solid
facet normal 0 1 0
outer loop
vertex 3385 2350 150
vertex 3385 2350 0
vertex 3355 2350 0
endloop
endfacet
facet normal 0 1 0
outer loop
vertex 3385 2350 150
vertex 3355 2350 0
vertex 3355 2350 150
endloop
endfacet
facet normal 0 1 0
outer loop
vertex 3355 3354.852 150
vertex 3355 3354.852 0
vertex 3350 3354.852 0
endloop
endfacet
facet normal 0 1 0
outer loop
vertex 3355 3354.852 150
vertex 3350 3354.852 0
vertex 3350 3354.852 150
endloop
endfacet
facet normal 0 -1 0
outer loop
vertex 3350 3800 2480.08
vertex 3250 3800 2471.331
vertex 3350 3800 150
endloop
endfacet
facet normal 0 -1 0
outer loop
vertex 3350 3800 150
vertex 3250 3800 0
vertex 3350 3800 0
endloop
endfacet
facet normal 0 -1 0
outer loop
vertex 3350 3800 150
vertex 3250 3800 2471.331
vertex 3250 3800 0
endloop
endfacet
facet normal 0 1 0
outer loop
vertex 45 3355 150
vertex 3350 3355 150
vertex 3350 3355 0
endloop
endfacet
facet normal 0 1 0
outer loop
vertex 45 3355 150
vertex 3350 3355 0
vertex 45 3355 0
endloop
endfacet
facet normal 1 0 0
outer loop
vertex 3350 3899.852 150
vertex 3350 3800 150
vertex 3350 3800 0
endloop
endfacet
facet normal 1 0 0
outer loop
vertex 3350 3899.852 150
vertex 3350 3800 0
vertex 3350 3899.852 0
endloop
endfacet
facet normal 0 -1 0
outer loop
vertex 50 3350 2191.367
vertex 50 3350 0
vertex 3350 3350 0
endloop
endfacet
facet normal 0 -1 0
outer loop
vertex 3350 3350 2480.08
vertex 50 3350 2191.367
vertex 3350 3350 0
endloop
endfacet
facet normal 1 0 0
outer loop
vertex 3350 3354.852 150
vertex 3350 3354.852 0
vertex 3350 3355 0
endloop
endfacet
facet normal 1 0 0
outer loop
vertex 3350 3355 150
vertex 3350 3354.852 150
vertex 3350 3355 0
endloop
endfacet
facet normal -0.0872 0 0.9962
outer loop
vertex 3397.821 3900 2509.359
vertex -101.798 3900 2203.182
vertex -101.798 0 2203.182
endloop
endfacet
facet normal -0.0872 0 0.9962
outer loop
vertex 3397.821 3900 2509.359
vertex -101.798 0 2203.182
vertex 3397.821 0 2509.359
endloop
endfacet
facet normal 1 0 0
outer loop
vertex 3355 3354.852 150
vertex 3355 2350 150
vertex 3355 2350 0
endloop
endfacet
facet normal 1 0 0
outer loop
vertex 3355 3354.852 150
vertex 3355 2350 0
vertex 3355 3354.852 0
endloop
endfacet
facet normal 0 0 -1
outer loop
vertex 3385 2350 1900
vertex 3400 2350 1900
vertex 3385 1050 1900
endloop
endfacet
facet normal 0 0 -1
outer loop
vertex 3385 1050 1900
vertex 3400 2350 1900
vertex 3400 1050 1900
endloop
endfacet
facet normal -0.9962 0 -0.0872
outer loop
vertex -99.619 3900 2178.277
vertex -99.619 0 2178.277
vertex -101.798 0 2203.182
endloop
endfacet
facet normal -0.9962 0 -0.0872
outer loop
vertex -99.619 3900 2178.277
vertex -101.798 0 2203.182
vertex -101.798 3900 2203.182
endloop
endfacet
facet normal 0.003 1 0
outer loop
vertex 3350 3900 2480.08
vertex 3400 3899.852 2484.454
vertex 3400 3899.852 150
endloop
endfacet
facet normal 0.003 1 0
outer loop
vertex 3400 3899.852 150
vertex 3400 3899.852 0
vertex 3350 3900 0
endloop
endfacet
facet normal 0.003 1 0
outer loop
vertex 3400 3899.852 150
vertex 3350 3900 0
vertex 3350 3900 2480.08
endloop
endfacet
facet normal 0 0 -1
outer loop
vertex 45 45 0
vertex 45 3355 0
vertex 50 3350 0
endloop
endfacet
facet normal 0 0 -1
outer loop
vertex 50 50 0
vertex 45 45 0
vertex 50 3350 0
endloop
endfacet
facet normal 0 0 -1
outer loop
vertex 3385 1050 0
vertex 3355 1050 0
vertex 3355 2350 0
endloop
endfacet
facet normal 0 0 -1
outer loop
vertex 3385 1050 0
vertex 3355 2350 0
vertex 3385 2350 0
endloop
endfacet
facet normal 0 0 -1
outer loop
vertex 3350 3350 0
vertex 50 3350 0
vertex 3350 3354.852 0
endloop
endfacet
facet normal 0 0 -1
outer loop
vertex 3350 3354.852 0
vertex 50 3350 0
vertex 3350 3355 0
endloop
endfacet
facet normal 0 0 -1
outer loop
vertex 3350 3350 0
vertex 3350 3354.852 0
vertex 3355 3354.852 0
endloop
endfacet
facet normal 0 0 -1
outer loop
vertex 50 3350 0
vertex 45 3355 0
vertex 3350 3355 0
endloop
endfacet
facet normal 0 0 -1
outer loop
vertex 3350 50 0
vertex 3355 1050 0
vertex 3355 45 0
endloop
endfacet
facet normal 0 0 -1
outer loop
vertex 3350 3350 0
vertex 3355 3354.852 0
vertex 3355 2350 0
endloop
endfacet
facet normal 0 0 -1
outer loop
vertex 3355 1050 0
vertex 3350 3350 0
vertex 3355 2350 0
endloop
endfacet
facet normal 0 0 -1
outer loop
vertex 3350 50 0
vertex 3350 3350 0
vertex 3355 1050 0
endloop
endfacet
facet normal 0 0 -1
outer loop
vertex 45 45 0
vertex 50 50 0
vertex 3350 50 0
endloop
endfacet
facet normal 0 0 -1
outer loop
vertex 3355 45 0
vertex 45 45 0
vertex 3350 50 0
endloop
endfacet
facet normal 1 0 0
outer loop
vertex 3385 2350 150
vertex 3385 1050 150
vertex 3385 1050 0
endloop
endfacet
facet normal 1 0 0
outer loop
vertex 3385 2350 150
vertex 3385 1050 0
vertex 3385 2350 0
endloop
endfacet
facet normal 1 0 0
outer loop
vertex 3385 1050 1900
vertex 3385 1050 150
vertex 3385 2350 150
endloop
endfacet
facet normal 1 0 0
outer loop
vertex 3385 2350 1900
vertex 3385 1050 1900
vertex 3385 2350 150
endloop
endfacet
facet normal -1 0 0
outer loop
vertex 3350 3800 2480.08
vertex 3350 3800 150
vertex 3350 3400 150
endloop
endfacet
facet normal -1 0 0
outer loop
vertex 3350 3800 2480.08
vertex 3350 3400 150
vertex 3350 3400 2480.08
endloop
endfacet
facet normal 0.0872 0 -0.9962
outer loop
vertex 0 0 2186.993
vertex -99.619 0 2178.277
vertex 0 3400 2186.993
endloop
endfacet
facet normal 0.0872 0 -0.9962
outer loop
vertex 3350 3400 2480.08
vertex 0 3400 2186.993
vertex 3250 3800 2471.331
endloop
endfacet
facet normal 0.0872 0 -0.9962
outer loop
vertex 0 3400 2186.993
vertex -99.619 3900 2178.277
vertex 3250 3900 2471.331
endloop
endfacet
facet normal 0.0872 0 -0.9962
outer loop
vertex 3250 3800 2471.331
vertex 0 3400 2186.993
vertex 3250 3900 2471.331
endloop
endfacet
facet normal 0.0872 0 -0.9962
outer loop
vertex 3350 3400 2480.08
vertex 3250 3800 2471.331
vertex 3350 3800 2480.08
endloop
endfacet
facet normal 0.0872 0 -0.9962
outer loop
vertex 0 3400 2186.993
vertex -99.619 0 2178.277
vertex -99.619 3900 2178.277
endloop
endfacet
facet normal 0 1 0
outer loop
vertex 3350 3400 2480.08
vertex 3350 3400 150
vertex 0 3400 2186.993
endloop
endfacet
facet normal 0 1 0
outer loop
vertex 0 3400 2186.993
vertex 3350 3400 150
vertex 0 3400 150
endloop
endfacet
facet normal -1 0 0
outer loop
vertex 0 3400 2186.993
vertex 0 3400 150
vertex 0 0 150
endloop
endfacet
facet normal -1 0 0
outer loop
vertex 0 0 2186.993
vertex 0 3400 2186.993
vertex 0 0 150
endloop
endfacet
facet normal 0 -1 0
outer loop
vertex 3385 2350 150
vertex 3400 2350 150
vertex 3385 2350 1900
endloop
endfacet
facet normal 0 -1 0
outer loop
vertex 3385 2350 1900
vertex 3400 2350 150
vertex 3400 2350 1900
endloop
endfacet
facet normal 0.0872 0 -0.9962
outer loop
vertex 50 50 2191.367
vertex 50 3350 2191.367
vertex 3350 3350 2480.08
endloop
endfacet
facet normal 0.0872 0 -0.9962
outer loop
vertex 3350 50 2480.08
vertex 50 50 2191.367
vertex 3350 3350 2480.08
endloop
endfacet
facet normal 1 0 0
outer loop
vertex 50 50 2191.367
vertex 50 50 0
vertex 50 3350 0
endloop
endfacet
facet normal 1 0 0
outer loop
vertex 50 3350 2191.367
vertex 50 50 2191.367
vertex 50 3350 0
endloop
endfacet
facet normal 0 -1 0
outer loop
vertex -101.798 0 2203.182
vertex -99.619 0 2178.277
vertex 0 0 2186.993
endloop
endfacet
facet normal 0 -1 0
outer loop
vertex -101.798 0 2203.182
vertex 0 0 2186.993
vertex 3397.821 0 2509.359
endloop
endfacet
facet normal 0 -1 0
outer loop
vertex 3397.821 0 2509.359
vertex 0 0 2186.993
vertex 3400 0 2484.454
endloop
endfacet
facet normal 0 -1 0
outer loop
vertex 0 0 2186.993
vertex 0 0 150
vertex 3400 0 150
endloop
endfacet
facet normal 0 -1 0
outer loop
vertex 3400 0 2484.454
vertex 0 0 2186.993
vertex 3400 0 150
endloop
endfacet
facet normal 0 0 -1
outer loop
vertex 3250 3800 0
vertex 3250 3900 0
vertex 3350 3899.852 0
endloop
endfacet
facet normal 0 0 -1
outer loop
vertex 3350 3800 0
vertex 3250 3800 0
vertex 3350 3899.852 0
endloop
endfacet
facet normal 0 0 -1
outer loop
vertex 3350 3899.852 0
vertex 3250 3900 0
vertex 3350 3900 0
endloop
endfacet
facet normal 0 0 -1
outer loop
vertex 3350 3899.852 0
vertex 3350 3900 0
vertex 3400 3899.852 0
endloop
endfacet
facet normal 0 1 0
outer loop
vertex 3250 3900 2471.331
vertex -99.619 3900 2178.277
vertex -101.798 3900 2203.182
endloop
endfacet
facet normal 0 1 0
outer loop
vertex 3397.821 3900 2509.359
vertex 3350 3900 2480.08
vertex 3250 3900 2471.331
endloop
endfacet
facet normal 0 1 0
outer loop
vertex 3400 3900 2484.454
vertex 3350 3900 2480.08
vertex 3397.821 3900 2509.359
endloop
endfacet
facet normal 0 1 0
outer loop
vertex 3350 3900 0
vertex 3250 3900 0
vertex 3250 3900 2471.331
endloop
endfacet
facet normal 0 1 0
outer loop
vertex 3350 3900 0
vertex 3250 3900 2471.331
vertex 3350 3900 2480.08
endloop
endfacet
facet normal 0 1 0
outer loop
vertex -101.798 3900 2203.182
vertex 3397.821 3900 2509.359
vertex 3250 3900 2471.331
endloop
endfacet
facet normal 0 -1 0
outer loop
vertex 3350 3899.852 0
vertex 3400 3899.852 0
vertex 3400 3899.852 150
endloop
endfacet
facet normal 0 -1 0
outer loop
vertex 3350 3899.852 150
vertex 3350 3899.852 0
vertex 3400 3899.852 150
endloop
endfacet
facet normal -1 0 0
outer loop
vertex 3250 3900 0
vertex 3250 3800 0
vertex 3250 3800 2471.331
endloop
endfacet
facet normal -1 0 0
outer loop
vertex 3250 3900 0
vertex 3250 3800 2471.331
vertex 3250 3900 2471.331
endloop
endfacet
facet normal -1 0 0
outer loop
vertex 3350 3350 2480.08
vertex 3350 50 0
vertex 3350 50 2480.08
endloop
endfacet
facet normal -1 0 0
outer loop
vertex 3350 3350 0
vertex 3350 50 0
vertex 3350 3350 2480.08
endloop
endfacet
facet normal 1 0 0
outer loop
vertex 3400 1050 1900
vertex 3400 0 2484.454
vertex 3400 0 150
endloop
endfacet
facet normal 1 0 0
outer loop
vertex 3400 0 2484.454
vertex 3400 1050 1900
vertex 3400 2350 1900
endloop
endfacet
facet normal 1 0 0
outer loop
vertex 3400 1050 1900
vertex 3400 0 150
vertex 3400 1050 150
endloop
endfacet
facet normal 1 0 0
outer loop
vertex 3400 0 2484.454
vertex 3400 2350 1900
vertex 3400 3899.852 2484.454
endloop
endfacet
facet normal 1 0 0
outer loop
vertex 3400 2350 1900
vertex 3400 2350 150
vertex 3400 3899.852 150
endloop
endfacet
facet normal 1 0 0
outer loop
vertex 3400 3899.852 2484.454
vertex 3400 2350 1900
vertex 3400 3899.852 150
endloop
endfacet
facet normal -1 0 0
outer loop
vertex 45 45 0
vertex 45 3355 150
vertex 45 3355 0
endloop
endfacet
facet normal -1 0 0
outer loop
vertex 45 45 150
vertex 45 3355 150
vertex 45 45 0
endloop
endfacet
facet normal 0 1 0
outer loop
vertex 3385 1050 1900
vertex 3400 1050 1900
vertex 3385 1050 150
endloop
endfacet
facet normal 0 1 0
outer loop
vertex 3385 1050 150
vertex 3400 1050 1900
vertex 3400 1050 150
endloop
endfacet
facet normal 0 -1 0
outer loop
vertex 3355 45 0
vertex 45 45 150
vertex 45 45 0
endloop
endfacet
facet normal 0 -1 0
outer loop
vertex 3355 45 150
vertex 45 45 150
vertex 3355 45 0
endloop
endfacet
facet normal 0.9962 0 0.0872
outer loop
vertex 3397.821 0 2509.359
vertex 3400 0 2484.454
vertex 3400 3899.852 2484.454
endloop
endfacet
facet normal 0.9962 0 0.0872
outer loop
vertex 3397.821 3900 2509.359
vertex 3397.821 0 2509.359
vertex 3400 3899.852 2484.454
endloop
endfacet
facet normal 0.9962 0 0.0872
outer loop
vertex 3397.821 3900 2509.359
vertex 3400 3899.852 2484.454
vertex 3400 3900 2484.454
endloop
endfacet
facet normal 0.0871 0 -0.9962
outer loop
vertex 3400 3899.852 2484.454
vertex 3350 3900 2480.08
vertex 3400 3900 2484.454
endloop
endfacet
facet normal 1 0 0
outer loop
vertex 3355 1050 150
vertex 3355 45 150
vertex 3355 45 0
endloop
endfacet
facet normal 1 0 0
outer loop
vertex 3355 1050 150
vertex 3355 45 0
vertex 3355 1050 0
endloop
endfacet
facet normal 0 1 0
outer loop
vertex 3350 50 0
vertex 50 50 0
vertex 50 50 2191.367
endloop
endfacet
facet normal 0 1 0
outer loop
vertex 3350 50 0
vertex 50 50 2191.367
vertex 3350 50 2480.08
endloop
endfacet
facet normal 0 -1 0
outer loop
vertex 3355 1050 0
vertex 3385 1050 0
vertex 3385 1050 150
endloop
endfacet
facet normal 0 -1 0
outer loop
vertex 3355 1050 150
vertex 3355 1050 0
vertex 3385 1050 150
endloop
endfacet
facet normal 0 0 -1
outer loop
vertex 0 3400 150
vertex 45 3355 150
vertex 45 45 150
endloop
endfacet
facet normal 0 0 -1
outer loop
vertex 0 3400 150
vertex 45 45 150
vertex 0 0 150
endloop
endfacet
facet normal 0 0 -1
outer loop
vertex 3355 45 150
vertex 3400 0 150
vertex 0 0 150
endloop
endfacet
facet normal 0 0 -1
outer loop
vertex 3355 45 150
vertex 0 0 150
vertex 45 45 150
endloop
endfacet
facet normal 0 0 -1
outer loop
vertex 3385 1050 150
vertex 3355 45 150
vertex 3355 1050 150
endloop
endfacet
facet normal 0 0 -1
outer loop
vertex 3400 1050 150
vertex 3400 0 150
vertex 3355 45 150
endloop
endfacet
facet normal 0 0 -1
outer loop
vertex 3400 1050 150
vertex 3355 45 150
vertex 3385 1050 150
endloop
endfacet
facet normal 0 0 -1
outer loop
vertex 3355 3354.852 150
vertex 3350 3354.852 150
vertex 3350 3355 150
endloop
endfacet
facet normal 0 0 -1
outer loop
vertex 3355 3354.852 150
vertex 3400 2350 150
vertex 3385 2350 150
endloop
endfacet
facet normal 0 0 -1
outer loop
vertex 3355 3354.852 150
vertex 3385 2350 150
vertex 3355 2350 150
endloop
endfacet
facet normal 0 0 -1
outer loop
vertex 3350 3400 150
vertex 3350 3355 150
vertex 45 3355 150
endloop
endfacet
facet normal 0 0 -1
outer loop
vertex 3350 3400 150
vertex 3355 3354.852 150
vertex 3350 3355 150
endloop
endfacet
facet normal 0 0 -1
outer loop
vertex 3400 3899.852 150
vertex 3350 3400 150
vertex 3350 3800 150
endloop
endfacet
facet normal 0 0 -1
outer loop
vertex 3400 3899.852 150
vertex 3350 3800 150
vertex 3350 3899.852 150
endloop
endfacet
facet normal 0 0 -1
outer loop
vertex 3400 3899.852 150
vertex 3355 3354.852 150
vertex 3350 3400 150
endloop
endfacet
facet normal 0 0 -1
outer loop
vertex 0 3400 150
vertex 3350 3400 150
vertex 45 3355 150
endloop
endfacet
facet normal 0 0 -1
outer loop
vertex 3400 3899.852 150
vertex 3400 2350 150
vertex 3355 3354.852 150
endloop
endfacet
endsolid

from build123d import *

# Parameters (mm, degrees)
F0_W      = 3300
F0_H      = 3300
F3_REACH  = 7658.4274260304
F4_W      = 3512.9874476474
F4_H      = 3900
F5_DEPTH  = 25
F0_W_2    = 100
F0_H_2    = 100
F8_DEPTH  = 15
F10_W     = 3400
F10_H     = 150
F11_DEPTH = 45
F9_W      = 3400
F9_H      = 150
F12_DEPTH = 45
F13_W     = 3305
F13_H     = 150
F14_DEPTH = 45
F7_W      = 1050
F7_H      = 150
F15_DEPTH = 45
F7_W_2    = 1004.8515605927
F16_DEPTH = 45
F7_W_3    = 545
F17_DEPTH = 50


with BuildPart() as f3:
    f3_end = Plane(origin=(-189.8836434212, 0, 2170.3799757433), x_dir=(0.9961946981, 0, 0.0871557427), z_dir=(-0.0871557427, 0, 0.9961946981))
    # F0 (on Top) → F3 (new body, up to a plane its end follows)
    with BuildSketch(Plane.XY):
        Polygon((0, 3400), (0, 0), (3400, 0), (3400, 3400), (3400, 3899.8515605927), (3350, 3900), (3350, 3800), (3350, 3400), align=None)
        with Locations((1700, 1700)):
            Rectangle(F0_W, F0_H, mode=Mode.SUBTRACT)
    f3_long = extrude(amount=F3_REACH, mode=Mode.PRIVATE)
    add(split(f3_long, bisect_by=f3_end, keep=Keep.BOTTOM, mode=Mode.PRIVATE))

    # F4 (on offset) → F5 (join)
    with BuildSketch(Plane(origin=(-189.8836434212, 0, 2170.3799757433), x_dir=(0.9961946981, 0, 0.0871557427), z_dir=(-0.0871557427, 0, 0.9961946981))):
        with Locations((1847.1026919149, 1950)):
            Rectangle(F4_W, F4_H)
    extrude(amount=F5_DEPTH)

    # F0 (on Top) → F6 (join, up to the next surface of F3)
    with BuildSketch(Plane.XY):
        with Locations((3300, 3850)):
            Rectangle(F0_W_2, F0_H_2)
    extrude(until=Until.NEXT)

    # F7 (on face) → F8 (cut)
    with BuildSketch(Plane.YZ.offset(3400)):
        Polygon((1450, 1900), (1450, 0), (2350, 0), (2350, 150), (2350, 275), (2350, 400), (2350, 525), (2350, 650), (2350, 775), (2350, 900), (2350, 1025), (2350, 1150), (2350, 1275), (2350, 1400), (2350, 1525), (2350, 1650), (2350, 1775), (2350, 1900), align=None)
        Polygon((1050, 150), (1050, 0), (1450, 0), (1450, 1900), (1050, 1900), (1050, 1775), (1050, 1650), (1050, 1525), (1050, 1400), (1050, 1275), (1050, 1150), (1050, 1025), (1050, 900), (1050, 775), (1050, 650), (1050, 525), (1050, 400), (1050, 275), align=None)
    extrude(amount=-F8_DEPTH, mode=Mode.SUBTRACT)

    # F10 (on face) → F11 (cut)
    with BuildSketch(Plane(origin=(0, 0, 0), x_dir=(0, -1, 0), z_dir=(-1, 0, 0))):
        with Locations((-1700, 75)):
            Rectangle(F10_W, F10_H)
    extrude(amount=-F11_DEPTH, mode=Mode.SUBTRACT)

    # F9 (on face) → F12 (cut)
    with BuildSketch(Plane.XZ):
        with Locations((1700, 75)):
            Rectangle(F9_W, F9_H)
    extrude(amount=-F12_DEPTH, mode=Mode.SUBTRACT)

    # F13 (on face) → F14 (cut)
    with BuildSketch(Plane(origin=(0, 3400, 0), x_dir=(-1, 0, 0), z_dir=(0, 1, 0))):
        with Locations((-1697.5, 75)):
            Rectangle(F13_W, F13_H)
    extrude(amount=-F14_DEPTH, mode=Mode.SUBTRACT)

    # F7 (on face) → F15 (cut)
    with BuildSketch(Plane.YZ.offset(3400)):
        with Locations((525, 75)):
            Rectangle(F7_W, F7_H)
    extrude(amount=-F15_DEPTH, mode=Mode.SUBTRACT)

    # F7 (on face) → F16 (cut)
    with BuildSketch(Plane.YZ.offset(3400)):
        with Locations((2852.4257802963, 75)):
            Rectangle(F7_W_2, F7_H)
    extrude(amount=-F16_DEPTH, mode=Mode.SUBTRACT)

    # F7 (on face) → F17 (cut)
    with BuildSketch(Plane.YZ.offset(3400)):
        with Locations((3627.3515605927, 75)):
            Rectangle(F7_W_3, F7_H)
    extrude(amount=-F17_DEPTH, mode=Mode.SUBTRACT)


solid = f3.part
